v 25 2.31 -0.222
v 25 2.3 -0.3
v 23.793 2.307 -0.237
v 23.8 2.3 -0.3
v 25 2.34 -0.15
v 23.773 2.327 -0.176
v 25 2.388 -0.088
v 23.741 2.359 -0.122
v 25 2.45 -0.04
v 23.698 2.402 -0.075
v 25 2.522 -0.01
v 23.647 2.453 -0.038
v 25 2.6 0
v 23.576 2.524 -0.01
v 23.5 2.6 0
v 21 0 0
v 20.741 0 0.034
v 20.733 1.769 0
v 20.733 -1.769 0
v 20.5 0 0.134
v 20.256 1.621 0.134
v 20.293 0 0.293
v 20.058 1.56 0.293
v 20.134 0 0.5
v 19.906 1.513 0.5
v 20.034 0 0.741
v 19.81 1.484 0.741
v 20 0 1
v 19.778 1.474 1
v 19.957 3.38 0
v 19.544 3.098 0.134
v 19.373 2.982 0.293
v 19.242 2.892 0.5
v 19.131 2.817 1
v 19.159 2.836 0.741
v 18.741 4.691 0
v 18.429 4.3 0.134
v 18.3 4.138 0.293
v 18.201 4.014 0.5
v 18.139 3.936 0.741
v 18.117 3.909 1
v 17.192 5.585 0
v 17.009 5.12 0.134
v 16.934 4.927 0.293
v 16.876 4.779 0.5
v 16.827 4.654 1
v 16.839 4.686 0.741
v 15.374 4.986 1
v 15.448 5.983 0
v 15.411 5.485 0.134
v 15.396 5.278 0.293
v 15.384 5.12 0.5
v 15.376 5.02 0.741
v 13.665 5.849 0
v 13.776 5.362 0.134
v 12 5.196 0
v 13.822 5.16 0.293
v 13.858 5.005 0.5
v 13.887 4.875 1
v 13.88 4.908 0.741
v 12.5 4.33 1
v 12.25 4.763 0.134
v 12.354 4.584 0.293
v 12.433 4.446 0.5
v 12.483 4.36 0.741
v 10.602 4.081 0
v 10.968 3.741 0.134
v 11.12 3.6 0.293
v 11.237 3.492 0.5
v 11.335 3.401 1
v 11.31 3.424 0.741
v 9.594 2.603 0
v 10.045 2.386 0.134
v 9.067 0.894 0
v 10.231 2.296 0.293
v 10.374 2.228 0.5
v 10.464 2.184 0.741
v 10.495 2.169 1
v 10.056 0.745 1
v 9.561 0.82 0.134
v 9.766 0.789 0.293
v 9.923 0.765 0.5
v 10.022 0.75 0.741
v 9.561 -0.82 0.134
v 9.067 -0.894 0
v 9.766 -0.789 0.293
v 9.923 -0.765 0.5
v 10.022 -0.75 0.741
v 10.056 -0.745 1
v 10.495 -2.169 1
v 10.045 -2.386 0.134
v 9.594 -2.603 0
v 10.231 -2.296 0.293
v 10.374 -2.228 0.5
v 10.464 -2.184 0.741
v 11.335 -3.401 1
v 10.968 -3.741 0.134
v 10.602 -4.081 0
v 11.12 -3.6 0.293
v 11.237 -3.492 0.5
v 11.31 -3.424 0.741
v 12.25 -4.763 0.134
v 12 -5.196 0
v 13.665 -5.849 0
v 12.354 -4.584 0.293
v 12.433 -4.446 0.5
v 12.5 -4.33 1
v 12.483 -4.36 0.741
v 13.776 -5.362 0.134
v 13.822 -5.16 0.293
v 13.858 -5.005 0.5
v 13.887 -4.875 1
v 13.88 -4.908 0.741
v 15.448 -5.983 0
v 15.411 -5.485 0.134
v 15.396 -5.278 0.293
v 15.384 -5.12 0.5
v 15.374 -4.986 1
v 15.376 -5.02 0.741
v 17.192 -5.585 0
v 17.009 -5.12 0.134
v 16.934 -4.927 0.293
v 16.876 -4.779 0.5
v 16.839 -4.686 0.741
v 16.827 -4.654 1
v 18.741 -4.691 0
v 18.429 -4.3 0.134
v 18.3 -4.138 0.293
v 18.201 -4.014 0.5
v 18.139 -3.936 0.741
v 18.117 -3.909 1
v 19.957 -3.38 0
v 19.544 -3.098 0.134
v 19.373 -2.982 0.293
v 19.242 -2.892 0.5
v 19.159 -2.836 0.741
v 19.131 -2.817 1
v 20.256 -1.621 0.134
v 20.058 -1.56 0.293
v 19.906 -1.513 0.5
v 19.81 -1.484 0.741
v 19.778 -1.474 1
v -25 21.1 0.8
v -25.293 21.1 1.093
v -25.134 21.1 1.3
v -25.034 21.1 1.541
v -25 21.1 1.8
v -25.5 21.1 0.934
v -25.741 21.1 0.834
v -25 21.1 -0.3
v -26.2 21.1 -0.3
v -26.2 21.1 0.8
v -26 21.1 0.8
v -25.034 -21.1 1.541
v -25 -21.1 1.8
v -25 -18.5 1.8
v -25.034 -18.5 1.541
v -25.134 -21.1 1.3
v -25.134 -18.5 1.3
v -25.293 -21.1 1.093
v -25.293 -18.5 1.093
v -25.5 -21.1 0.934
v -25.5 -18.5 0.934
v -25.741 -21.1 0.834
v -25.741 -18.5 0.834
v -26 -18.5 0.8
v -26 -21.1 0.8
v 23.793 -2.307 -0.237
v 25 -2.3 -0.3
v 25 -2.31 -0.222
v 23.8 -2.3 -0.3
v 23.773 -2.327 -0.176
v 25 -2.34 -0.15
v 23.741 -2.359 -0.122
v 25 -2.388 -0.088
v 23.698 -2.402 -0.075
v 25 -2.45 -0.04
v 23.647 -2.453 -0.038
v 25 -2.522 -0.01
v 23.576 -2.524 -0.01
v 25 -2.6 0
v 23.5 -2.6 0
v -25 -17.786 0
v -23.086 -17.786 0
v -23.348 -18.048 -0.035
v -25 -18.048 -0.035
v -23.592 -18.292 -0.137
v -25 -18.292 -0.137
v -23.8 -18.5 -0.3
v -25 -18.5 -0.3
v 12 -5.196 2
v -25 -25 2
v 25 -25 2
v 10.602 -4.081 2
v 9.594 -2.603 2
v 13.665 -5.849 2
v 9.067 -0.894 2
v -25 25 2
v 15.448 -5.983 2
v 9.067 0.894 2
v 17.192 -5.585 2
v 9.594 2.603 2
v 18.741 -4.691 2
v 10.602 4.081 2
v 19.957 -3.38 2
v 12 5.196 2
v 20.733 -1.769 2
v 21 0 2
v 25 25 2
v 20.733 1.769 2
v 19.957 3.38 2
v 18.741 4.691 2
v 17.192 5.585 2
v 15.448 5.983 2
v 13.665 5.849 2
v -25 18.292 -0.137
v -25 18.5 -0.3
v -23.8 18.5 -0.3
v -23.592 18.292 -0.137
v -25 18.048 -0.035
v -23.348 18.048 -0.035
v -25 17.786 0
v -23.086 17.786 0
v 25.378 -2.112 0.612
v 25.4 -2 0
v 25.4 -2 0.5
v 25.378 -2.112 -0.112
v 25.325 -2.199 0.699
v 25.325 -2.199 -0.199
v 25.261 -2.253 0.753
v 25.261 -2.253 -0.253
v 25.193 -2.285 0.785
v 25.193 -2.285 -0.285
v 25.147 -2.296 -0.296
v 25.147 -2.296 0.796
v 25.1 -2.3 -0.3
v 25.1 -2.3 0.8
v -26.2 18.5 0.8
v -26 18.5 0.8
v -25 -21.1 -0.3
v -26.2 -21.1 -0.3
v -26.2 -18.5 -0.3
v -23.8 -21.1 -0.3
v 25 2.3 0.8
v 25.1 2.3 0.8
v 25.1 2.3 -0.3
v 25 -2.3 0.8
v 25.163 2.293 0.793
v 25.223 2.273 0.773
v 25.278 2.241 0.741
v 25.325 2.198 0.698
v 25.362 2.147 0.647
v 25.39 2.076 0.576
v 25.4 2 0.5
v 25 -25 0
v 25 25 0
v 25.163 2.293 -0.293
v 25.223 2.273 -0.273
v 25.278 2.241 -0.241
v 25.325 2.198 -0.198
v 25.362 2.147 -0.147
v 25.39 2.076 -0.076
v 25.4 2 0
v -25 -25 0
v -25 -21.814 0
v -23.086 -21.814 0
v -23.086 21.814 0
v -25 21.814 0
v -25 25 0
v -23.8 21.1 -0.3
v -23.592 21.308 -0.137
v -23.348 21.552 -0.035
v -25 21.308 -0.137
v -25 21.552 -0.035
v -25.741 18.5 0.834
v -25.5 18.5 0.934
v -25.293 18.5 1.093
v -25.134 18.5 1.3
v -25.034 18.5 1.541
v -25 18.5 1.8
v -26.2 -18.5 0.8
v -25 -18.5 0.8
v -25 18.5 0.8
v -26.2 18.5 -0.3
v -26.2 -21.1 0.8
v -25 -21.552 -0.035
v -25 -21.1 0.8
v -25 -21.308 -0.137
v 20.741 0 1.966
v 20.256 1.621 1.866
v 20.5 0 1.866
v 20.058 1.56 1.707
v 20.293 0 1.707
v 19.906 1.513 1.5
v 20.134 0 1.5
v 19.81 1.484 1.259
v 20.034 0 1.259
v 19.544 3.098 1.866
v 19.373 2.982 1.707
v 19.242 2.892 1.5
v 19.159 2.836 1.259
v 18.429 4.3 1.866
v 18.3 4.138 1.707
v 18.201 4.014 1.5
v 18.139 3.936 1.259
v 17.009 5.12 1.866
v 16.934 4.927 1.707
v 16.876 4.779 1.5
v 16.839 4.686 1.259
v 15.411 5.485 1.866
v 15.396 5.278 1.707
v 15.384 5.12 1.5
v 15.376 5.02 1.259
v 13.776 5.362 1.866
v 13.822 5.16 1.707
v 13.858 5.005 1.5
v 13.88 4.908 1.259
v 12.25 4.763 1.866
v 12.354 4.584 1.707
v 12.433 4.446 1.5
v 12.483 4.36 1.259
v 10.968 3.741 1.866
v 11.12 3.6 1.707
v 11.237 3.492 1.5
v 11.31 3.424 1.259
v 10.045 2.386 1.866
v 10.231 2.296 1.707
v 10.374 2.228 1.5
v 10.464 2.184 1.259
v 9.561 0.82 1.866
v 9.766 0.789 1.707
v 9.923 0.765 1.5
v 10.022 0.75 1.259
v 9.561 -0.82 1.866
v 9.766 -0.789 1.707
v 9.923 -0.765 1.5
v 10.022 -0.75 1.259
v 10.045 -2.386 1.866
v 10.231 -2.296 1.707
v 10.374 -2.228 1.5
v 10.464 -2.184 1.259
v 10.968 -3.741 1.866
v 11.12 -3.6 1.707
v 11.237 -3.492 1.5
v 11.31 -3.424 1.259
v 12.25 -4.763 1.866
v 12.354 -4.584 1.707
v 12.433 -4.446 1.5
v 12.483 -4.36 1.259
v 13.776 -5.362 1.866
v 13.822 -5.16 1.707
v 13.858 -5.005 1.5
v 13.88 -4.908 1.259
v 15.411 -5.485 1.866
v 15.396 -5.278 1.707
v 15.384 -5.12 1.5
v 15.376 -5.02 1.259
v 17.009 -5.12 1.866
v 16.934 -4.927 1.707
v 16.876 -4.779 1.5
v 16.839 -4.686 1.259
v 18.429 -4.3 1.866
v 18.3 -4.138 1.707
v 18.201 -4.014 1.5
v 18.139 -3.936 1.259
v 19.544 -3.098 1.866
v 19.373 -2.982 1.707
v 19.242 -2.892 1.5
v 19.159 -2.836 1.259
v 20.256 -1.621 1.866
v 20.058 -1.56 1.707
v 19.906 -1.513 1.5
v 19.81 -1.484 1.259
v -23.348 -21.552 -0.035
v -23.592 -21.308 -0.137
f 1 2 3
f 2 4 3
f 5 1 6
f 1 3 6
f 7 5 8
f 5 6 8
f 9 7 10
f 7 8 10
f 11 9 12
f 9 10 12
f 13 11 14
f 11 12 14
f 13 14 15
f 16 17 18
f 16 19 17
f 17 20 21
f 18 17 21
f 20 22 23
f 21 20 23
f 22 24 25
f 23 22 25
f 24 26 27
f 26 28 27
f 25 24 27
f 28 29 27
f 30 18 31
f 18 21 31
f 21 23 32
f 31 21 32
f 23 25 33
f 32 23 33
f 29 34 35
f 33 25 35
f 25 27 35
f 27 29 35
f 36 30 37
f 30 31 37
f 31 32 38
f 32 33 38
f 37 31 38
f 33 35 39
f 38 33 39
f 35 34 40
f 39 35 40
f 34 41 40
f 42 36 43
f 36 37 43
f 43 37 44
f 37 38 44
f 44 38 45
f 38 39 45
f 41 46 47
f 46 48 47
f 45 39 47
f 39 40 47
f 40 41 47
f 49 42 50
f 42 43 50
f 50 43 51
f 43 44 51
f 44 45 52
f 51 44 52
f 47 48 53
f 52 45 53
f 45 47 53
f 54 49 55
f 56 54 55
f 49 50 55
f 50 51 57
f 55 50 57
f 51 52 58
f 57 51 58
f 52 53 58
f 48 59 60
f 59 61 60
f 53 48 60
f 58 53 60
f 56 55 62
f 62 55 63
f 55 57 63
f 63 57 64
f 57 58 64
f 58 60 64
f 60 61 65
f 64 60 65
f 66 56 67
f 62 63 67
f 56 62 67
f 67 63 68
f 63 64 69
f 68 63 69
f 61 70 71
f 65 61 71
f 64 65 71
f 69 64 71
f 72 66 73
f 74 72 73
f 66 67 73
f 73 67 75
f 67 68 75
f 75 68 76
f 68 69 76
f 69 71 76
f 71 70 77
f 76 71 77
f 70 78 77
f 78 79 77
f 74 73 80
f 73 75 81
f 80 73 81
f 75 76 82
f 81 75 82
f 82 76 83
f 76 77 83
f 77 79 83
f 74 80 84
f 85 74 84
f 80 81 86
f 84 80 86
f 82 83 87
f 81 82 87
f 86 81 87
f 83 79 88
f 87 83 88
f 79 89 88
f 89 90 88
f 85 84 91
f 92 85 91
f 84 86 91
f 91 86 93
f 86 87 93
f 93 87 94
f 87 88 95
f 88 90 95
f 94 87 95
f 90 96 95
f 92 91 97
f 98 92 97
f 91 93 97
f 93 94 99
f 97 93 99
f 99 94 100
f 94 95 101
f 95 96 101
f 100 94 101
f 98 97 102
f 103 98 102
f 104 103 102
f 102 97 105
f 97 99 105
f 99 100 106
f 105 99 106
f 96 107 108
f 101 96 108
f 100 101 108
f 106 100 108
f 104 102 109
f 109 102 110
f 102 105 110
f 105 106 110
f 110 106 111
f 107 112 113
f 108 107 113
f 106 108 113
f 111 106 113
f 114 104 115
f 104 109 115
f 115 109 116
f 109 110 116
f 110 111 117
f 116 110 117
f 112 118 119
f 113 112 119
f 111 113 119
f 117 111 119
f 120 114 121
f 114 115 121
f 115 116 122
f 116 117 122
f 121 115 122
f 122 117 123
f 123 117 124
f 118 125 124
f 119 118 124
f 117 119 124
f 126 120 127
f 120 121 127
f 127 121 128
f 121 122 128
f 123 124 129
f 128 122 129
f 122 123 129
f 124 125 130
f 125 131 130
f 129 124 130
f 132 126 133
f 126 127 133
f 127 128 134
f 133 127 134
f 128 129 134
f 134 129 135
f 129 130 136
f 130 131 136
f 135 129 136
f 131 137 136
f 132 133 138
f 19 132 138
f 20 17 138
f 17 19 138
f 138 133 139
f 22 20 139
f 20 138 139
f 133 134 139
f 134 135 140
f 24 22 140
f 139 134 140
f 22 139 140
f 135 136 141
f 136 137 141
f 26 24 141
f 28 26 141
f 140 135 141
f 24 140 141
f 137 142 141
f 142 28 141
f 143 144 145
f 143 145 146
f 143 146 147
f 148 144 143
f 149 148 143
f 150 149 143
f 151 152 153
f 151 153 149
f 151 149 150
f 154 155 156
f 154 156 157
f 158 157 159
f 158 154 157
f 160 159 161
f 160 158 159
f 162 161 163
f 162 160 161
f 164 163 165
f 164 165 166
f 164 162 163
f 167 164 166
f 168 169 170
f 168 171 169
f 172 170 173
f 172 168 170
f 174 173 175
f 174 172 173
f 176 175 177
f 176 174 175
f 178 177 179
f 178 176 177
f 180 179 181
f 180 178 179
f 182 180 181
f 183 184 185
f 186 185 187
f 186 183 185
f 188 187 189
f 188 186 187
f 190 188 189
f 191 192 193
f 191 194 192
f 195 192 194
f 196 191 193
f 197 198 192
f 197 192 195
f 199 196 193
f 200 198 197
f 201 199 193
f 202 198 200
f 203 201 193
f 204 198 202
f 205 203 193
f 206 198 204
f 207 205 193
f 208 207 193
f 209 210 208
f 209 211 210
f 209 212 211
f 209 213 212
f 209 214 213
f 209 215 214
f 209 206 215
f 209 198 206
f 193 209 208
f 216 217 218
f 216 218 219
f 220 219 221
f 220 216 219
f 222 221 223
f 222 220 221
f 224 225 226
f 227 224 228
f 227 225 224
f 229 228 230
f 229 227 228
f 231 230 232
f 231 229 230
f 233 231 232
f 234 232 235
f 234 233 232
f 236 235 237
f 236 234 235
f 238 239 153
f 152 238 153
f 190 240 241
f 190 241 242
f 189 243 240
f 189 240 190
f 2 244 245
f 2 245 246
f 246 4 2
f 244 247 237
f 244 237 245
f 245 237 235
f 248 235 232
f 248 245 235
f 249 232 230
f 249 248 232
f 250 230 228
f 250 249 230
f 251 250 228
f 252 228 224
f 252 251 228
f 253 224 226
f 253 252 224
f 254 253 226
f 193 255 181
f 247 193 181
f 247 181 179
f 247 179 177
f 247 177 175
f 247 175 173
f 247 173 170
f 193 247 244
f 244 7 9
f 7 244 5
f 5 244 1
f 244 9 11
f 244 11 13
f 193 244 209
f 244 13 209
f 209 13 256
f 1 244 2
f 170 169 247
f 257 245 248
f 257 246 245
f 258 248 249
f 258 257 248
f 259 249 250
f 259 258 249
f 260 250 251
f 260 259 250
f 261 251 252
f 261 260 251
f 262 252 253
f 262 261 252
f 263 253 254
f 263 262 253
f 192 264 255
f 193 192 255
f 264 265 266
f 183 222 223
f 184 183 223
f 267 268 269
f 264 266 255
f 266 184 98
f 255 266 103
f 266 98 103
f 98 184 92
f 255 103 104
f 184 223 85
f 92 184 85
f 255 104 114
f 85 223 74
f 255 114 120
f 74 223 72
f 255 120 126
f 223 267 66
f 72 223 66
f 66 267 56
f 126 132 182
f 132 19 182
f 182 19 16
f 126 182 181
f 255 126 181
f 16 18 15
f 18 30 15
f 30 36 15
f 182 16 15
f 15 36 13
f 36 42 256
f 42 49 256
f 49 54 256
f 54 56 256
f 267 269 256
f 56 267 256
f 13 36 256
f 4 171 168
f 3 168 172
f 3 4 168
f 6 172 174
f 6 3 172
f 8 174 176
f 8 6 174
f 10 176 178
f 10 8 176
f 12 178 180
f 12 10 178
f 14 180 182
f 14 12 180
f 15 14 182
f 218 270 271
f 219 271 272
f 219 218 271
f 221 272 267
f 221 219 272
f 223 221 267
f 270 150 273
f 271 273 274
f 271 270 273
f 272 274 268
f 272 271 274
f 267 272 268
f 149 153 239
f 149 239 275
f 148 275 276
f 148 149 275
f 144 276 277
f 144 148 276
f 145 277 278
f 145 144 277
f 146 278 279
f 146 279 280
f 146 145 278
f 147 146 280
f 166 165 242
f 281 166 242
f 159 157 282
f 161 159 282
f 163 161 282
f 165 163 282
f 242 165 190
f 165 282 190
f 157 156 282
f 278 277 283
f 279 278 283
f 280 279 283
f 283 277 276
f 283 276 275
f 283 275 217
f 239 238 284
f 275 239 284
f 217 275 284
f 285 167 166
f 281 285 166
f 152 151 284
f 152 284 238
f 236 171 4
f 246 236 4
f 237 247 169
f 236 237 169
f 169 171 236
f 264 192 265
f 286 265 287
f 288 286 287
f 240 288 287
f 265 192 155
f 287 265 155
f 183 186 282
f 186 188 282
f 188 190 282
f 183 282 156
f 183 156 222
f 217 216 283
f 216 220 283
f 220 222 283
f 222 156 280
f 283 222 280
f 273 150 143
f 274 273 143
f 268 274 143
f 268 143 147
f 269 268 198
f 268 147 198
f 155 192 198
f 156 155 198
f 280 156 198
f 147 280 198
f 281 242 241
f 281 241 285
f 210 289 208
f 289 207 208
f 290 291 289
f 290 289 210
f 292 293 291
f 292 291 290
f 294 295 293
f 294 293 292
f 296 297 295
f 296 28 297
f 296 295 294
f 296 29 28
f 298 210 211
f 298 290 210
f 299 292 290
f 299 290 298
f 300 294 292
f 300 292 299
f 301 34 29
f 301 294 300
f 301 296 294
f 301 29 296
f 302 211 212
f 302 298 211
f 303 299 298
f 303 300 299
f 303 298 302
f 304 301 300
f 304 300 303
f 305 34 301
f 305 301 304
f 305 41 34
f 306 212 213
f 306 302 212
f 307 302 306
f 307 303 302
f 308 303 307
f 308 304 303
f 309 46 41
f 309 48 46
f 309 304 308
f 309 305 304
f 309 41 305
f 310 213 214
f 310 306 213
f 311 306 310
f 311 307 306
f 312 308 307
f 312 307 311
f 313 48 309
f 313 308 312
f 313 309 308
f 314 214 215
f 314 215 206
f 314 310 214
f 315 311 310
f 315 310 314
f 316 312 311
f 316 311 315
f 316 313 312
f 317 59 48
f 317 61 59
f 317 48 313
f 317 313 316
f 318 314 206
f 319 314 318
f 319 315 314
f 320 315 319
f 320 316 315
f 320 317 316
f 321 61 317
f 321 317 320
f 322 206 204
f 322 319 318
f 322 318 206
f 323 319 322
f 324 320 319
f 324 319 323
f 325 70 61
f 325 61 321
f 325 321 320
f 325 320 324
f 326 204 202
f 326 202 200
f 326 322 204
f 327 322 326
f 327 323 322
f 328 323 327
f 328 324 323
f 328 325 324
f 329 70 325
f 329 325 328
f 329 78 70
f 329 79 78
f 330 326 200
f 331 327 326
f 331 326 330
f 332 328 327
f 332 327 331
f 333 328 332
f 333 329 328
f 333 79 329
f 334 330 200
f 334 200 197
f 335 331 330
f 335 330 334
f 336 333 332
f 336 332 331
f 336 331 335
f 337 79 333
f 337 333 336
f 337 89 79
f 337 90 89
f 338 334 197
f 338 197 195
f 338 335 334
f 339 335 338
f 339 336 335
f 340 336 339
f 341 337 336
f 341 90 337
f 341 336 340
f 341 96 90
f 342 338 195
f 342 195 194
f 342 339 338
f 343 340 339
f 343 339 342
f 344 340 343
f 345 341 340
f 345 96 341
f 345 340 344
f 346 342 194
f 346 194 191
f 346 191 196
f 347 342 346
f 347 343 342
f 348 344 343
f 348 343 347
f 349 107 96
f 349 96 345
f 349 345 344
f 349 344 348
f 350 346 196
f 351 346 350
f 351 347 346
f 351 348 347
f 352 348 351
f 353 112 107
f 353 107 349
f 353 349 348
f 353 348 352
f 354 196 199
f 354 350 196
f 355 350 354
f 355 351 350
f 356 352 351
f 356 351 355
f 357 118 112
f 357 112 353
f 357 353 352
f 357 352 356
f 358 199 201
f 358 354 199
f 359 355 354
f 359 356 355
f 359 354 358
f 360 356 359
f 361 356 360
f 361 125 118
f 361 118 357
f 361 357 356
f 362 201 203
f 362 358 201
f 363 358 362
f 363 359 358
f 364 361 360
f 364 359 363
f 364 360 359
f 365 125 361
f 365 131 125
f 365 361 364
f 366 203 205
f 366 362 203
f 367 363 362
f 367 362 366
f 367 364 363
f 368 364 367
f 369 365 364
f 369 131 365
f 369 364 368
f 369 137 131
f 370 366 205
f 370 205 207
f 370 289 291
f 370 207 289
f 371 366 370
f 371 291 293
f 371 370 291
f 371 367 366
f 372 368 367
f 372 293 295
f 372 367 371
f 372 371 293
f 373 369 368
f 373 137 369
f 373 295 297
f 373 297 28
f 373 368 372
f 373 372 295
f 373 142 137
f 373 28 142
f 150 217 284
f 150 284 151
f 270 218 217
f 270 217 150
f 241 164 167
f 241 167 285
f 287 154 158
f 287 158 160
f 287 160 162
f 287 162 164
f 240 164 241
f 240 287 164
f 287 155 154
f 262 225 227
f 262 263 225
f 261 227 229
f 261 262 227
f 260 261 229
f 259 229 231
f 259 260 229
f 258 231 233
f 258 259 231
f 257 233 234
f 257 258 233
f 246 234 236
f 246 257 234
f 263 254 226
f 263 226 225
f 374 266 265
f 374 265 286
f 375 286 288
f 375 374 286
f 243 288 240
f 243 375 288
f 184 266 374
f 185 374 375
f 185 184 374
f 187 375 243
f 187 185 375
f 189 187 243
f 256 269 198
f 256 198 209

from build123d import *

# Parameters (mm, degrees)
SKETCH1_W                = 50
SKETCH1_H                = 50
BOSS_EXTRUDE1_DEPTH      = 2
BOSS_EXTRUDE2_DEPTH      = 1.2
BOSS_EXTRUDE2_DEPTH_BACK = 1.2
SKETCH3_W                = 1.1
SKETCH3_H                = 2.6
FILLET1_R                = 1
BOSS_EXTRUDE3_DEPTH      = 0.4
BOSS_EXTRUDE3_DEPTH_BACK = 1.2
SKETCH6_W                = 1.1
SKETCH6_H                = 4.6
FILLET2_R                = 0.3
FILLET3_R                = 0.3
CUT_EXTRUDE1_REACH       = 38.287
SKETCH7_R                = 5
FILLET5_R                = 1


# Some blends are built 0.0001 mm under size
with BuildPart() as part:
    # Sketch1 → Boss-Extrude1 (new body)
    with BuildSketch(Plane.XY):
        Rectangle(SKETCH1_W, SKETCH1_H)
    extrude(amount=BOSS_EXTRUDE1_DEPTH)

    # Sketch3 → Boss-Extrude2 (add, two sides: drawn at the far end of the back side and taken through both)
    with BuildSketch(Plane.ZY.offset(25).offset(-BOSS_EXTRUDE2_DEPTH_BACK)):
        with Locations((0.25, 19.8)):
            Rectangle(SKETCH3_W, SKETCH3_H)
        with Locations((0.25, -19.8)):
            Rectangle(SKETCH3_W, SKETCH3_H)
    extrude(amount=BOSS_EXTRUDE2_DEPTH + BOSS_EXTRUDE2_DEPTH_BACK)

    # Fillet1
    # the kernel refuses this fillet: 1 mm, written as the material it adds along each edge
    with BuildSketch(Plane(origin=(-23.8, 21.1, 0), x_dir=(0, 1, 0), z_dir=(-1, 0, 0)), Plane(origin=(-25, 18.5, 0), x_dir=(0, -1, 0), z_dir=(1, 0, 0))) as fillet1_piece_1:
        with BuildLine():
            CenterArc((0.714142843, 1), FILLET1_R, 224.427004001, 45.572995999)
            Line((0, 0.3), (-0.014282857, 0.286))
            ThreePointArc((-0.014282857, 0.286), (-0.02, 0.15), (-0.02, 0))
            Line((-0.02, 0), (0, -0.02))
            Line((0, -0.02), (0.714142843, -0.02))
            Line((0.714142843, -0.02), (0.714142843, 0))
        make_face()
    extrude(amount=1.2)
    with BuildSketch(Plane(origin=(-23.8, -21.1, 0), x_dir=(0, -1, 0), z_dir=(-1, 0, 0)), Plane(origin=(-25, -18.5, 0), x_dir=(0, 1, 0), z_dir=(1, 0, 0))) as fillet1_piece_2:
        with BuildLine():
            CenterArc((0.714142843, -1), FILLET1_R, 90, 45.572995999)
            Line((0, -0.3), (-0.014282857, -0.286))
            ThreePointArc((-0.014282857, -0.286), (-0.02, -0.15), (-0.02, 0))
            Line((-0.02, 0), (0, 0.02))
            Line((0, 0.02), (0.714142843, 0.02))
            Line((0.714142843, 0.02), (0.714142843, 0))
        make_face()
    extrude(amount=1.2)
    with BuildSketch(Plane(origin=(-23.8, -18.5, 0), x_dir=(1, 0, 0), z_dir=(0, -1, 0))) as fillet1_piece_3:
        with BuildLine():
            CenterArc((0.714142843, -1), FILLET1_R, 90, 45.572995999)
            Line((0, -0.3), (-0.014282857, -0.286))
            ThreePointArc((-0.014282857, -0.286), (-0.02, -0.15), (-0.02, 0))
            Line((-0.02, 0), (0, 0.02))
            Line((0, 0.02), (0.714142843, 0.02))
            Line((0.714142843, 0.02), (0.714142843, 0))
        make_face()
    extrude(amount=2.6)
    with BuildSketch(Plane(origin=(-23.8, 18.5, 0), x_dir=(1, 0, 0), z_dir=(0, 1, 0))) as fillet1_piece_4:
        with BuildLine():
            CenterArc((0.714142843, 1), FILLET1_R, 224.427004001, 45.572995999)
            Line((0, 0.3), (-0.014282857, 0.286))
            ThreePointArc((-0.014282857, 0.286), (-0.02, 0.15), (-0.02, 0))
            Line((-0.02, 0), (0, -0.02))
            Line((0, -0.02), (0.714142843, -0.02))
            Line((0.714142843, -0.02), (0.714142843, 0))
        make_face()
    extrude(amount=2.6)
    with BuildSketch(Plane(origin=(-25, -21.1, 0.8), x_dir=(0, 0, 1), z_dir=(0, 1, 0))) as fillet1_piece_5:
        with BuildLine():
            CenterArc((FILLET1_R, -FILLET1_R), FILLET1_R, 90, 90)
            Line((0, -FILLET1_R), (-FILLET1_R * 0.02, -FILLET1_R))
            Line((-FILLET1_R * 0.02, -FILLET1_R), (-FILLET1_R * 0.02, FILLET1_R * 0.02))
            Line((-FILLET1_R * 0.02, FILLET1_R * 0.02), (FILLET1_R, FILLET1_R * 0.02))
            Line((FILLET1_R, FILLET1_R * 0.02), (FILLET1_R, 0))
        make_face()
    extrude(amount=2.6)
    with BuildSketch(Plane(origin=(-25, 21.1, 0.8), x_dir=(0, 0, 1), z_dir=(0, -1, 0))) as fillet1_piece_6:
        with BuildLine():
            CenterArc((FILLET1_R, FILLET1_R), FILLET1_R, 180, 90)
            Line((0, FILLET1_R), (-FILLET1_R * 0.02, FILLET1_R))
            Line((-FILLET1_R * 0.02, FILLET1_R), (-FILLET1_R * 0.02, -FILLET1_R * 0.02))
            Line((-FILLET1_R * 0.02, -FILLET1_R * 0.02), (FILLET1_R, -FILLET1_R * 0.02))
            Line((FILLET1_R, -FILLET1_R * 0.02), (FILLET1_R, 0))
        make_face()
    extrude(amount=2.6)
    with BuildSketch(Plane(origin=(-22.014642893, 21.1, 0), x_dir=(0, 1, 0), z_dir=(-1, 0, 0))) as fillet1_piece_7a_section:
        with BuildLine():
            CenterArc((0.714142843, 1), FILLET1_R, 224.427004001, 45.572995999)
            Line((0, 0.3), (-0.014282857, 0.286))
            ThreePointArc((-0.014282857, 0.286), (-0.02, 0.15), (-0.02, 0))
            Line((-0.02, 0), (0, -0.02))
            Line((0, -0.02), (0.714142843, -0.02))
            Line((0.714142843, -0.02), (0.714142843, 0))
        make_face()
    fillet1_piece_7a = extrude(amount=2.985357107, mode=Mode.PRIVATE)
    fillet1_piece_7a = split(fillet1_piece_7a, bisect_by=Plane(origin=(-23.8, 21.290996304, -0.074177971), z_dir=(1, 0, 0)), keep=Keep.TOP, mode=Mode.PRIVATE)
    with BuildSketch(Plane(origin=(-23.8, 18.5, 0), x_dir=(1, 0, 0), z_dir=(0, 1, 0))) as fillet1_piece_7b_section:
        with BuildLine():
            CenterArc((0.714142843, 1), FILLET1_R, 224.427004001, 45.572995999)
            Line((0, 0.3), (-0.014282857, 0.286))
            ThreePointArc((-0.014282857, 0.286), (-0.02, 0.15), (-0.02, 0))
            Line((-0.02, 0), (0, -0.02))
            Line((0, -0.02), (0.714142843, -0.02))
            Line((0.714142843, -0.02), (0.714142843, 0))
        make_face()
    fillet1_piece_7b = extrude(amount=4.385357107, mode=Mode.PRIVATE)
    fillet1_piece_7b = split(fillet1_piece_7b, bisect_by=Plane(origin=(-23.609003696, 21.1, -0.074177971), z_dir=(0, 1, 0)), keep=Keep.TOP, mode=Mode.PRIVATE)
    fillet1_piece_7 = fillet1_piece_7a & fillet1_piece_7b
    add(fillet1_piece_7)
    with BuildSketch(Plane(origin=(-23.8, 16.714642893, 0), x_dir=(1, 0, 0), z_dir=(0, 1, 0))) as fillet1_piece_8a_section:
        with BuildLine():
            CenterArc((0.714142843, 1), FILLET1_R, 224.427004001, 45.572995999)
            Line((0, 0.3), (-0.014282857, 0.286))
            ThreePointArc((-0.014282857, 0.286), (-0.02, 0.15), (-0.02, 0))
            Line((-0.02, 0), (0, -0.02))
            Line((0, -0.02), (0.714142843, -0.02))
            Line((0.714142843, -0.02), (0.714142843, 0))
        make_face()
    fillet1_piece_8a = extrude(amount=4.385357107, mode=Mode.PRIVATE)
    fillet1_piece_8a = split(fillet1_piece_8a, bisect_by=Plane(origin=(-23.609003696, 18.5, -0.074177971), z_dir=(0, -1, 0)), keep=Keep.TOP, mode=Mode.PRIVATE)
    with BuildSketch(Plane(origin=(-25, 18.5, 0), x_dir=(0, -1, 0), z_dir=(1, 0, 0))) as fillet1_piece_8b_section:
        with BuildLine():
            CenterArc((0.714142843, 1), FILLET1_R, 224.427004001, 45.572995999)
            Line((0, 0.3), (-0.014282857, 0.286))
            ThreePointArc((-0.014282857, 0.286), (-0.02, 0.15), (-0.02, 0))
            Line((-0.02, 0), (0, -0.02))
            Line((0, -0.02), (0.714142843, -0.02))
            Line((0.714142843, -0.02), (0.714142843, 0))
        make_face()
    fillet1_piece_8b = extrude(amount=2.985357107, mode=Mode.PRIVATE)
    fillet1_piece_8b = split(fillet1_piece_8b, bisect_by=Plane(origin=(-23.8, 18.309003696, -0.074177971), z_dir=(1, 0, 0)), keep=Keep.TOP, mode=Mode.PRIVATE)
    fillet1_piece_8 = fillet1_piece_8a & fillet1_piece_8b
    add(fillet1_piece_8)
    with BuildSketch(Plane(origin=(-23.8, -18.5, 0), x_dir=(1, 0, 0), z_dir=(0, -1, 0))) as fillet1_piece_9a_section:
        with BuildLine():
            CenterArc((0.714142843, -1), FILLET1_R, 90, 45.572995999)
            Line((0, -0.3), (-0.014282857, -0.286))
            ThreePointArc((-0.014282857, -0.286), (-0.02, -0.15), (-0.02, 0))
            Line((-0.02, 0), (0, 0.02))
            Line((0, 0.02), (0.714142843, 0.02))
            Line((0.714142843, 0.02), (0.714142843, 0))
        make_face()
    fillet1_piece_9a = extrude(amount=4.385357107, mode=Mode.PRIVATE)
    fillet1_piece_9a = split(fillet1_piece_9a, bisect_by=Plane(origin=(-23.609003696, -21.1, -0.074177971), z_dir=(0, -1, 0)), keep=Keep.TOP, mode=Mode.PRIVATE)
    with BuildSketch(Plane(origin=(-22.014642893, -21.1, 0), x_dir=(0, -1, 0), z_dir=(-1, 0, 0))) as fillet1_piece_9b_section:
        with BuildLine():
            CenterArc((0.714142843, -1), FILLET1_R, 90, 45.572995999)
            Line((0, -0.3), (-0.014282857, -0.286))
            ThreePointArc((-0.014282857, -0.286), (-0.02, -0.15), (-0.02, 0))
            Line((-0.02, 0), (0, 0.02))
            Line((0, 0.02), (0.714142843, 0.02))
            Line((0.714142843, 0.02), (0.714142843, 0))
        make_face()
    fillet1_piece_9b = extrude(amount=2.985357107, mode=Mode.PRIVATE)
    fillet1_piece_9b = split(fillet1_piece_9b, bisect_by=Plane(origin=(-23.8, -21.290996304, -0.074177971), z_dir=(1, 0, 0)), keep=Keep.TOP, mode=Mode.PRIVATE)
    fillet1_piece_9 = fillet1_piece_9a & fillet1_piece_9b
    add(fillet1_piece_9)
    with BuildSketch(Plane(origin=(-25, -18.5, 0), x_dir=(0, 1, 0), z_dir=(1, 0, 0))) as fillet1_piece_10a_section:
        with BuildLine():
            CenterArc((0.714142843, -1), FILLET1_R, 90, 45.572995999)
            Line((0, -0.3), (-0.014282857, -0.286))
            ThreePointArc((-0.014282857, -0.286), (-0.02, -0.15), (-0.02, 0))
            Line((-0.02, 0), (0, 0.02))
            Line((0, 0.02), (0.714142843, 0.02))
            Line((0.714142843, 0.02), (0.714142843, 0))
        make_face()
    fillet1_piece_10a = extrude(amount=2.985357107, mode=Mode.PRIVATE)
    fillet1_piece_10a = split(fillet1_piece_10a, bisect_by=Plane(origin=(-23.8, -18.309003696, -0.074177971), z_dir=(1, 0, 0)), keep=Keep.TOP, mode=Mode.PRIVATE)
    with BuildSketch(Plane(origin=(-23.8, -16.714642893, 0), x_dir=(1, 0, 0), z_dir=(0, -1, 0))) as fillet1_piece_10b_section:
        with BuildLine():
            CenterArc((0.714142843, -1), FILLET1_R, 90, 45.572995999)
            Line((0, -0.3), (-0.014282857, -0.286))
            ThreePointArc((-0.014282857, -0.286), (-0.02, -0.15), (-0.02, 0))
            Line((-0.02, 0), (0, 0.02))
            Line((0, 0.02), (0.714142843, 0.02))
            Line((0.714142843, 0.02), (0.714142843, 0))
        make_face()
    fillet1_piece_10b = extrude(amount=4.385357107, mode=Mode.PRIVATE)
    fillet1_piece_10b = split(fillet1_piece_10b, bisect_by=Plane(origin=(-23.609003696, -18.5, -0.074177971), z_dir=(0, 1, 0)), keep=Keep.TOP, mode=Mode.PRIVATE)
    fillet1_piece_10 = fillet1_piece_10a & fillet1_piece_10b
    add(fillet1_piece_10)

    # Sketch6 → Boss-Extrude3 (add, two sides: drawn at the far end of the back side and taken through both)
    with BuildSketch(Plane(origin=(25, 0, 0), x_dir=(0, 0, -1), z_dir=(1, 0, 0)).offset(-BOSS_EXTRUDE3_DEPTH_BACK)):
        with Locations((-0.25, 0)):
            Rectangle(SKETCH6_W, SKETCH6_H)
    extrude(amount=BOSS_EXTRUDE3_DEPTH + BOSS_EXTRUDE3_DEPTH_BACK)

    # Fillet2
    fillet2_edges = [part.edges().sort_by_distance(p)[0] for p in [
        (25.4, 2.3, 0.25),
        (25.4, -2.3, 0.25),
        (25.4, 0, 0.8),
        (25.4, 0, -0.3),
    ]]
    fillet(fillet2_edges, radius=FILLET2_R)

    # Fillet3
    fillet3_edges = [part.edges().sort_by_distance(p)[0] for p in [
        (24.4, -2.3, 0),
        (24.4, 2.3, 0),
        (23.8, 0, 0),
    ]]
    fillet(fillet3_edges, radius=FILLET3_R - 0.0001)  # a hair under: the kernel refuses the full size

    # Sketch7 → Cut-Extrude1 (cut, up to next)
    with BuildSketch(Plane.XY.offset(2), mode=Mode.PRIVATE) as cut_extrude1_sk1:
        with Locations((15, 0)):
            Circle(SKETCH7_R)
    cut_extrude1_tool1 = extrude(cut_extrude1_sk1.sketch, amount=-CUT_EXTRUDE1_REACH, mode=Mode.PRIVATE) & part.part
    add(cut_extrude1_tool1.solids().sort_by_distance((15, 0, 2))[0], mode=Mode.SUBTRACT)

    # Fillet5
    fillet5_edges = [part.edges().sort_by_distance(p)[0] for p in [
        (10, 0, 2),
        (10, 0, 0),
    ]]
    fillet(fillet5_edges, radius=FILLET5_R - 0.0001)  # a hair under: the kernel refuses the full size


solid = part.part
